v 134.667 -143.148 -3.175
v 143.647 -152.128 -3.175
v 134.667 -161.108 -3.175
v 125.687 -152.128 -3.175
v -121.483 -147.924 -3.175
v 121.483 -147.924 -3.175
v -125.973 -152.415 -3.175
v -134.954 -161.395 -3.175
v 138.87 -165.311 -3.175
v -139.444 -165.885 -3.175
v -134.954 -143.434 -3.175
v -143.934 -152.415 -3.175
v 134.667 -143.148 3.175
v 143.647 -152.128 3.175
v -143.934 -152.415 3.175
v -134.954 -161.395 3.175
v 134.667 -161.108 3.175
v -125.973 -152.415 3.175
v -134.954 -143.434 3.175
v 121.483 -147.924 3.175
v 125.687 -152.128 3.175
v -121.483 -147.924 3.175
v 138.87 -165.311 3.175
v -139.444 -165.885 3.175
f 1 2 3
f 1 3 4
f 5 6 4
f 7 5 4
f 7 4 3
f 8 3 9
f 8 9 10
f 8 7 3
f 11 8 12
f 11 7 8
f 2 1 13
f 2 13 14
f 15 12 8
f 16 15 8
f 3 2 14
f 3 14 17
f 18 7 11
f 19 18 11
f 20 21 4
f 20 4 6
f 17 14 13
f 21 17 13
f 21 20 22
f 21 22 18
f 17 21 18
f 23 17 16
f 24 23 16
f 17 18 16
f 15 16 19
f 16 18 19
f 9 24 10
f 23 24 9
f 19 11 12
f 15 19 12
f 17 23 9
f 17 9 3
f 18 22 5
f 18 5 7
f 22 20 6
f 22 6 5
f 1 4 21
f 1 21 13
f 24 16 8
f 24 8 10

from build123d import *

# Parameters (mm, degrees)
BOSS_EXTRUDE1_DEPTH = 3.175
BOSS_EXTRUDE2_DEPTH = 6.35
BOSS_EXTRUDE4_DEPTH = 6.35


with BuildPart() as part:
    # Sketch1 → Boss-Extrude1 (new, symmetric)
    with BuildSketch(Plane.XY):
        Polygon((-139.443807584, -165.884900532), (138.870288723, -165.311381671), (121.483295342, -147.92438829), (-121.483295342, -147.92438829), align=None)
    extrude(amount=BOSS_EXTRUDE1_DEPTH, both=True)

    # Sketch2 → Boss-Extrude2 (add)
    with BuildSketch(Plane(origin=(0, 0, -3.175), x_dir=(-1, 0, 0), z_dir=(0, 0, -1))):
        Polygon((-125.686663972, -152.12775692), (-134.666920093, -143.147500799), (-143.647176214, -152.12775692), (-134.666920093, -161.108013041), (-138.870288723, -165.311381671), (139.443807584, -165.884900532), (121.483295342, -147.92438829), (-121.483295342, -147.92438829), align=None)
    extrude(amount=-BOSS_EXTRUDE2_DEPTH)

    # Sketch3 → Boss-Extrude4 (add)
    with BuildSketch(Plane(origin=(0, 0, -3.175), x_dir=(-1, 0, 0), z_dir=(0, 0, -1))):
        Polygon((125.973423403, -152.41451635), (134.953679524, -143.434260229), (143.933935645, -152.41451635), (134.953679524, -161.394772471), align=None)
    extrude(amount=-BOSS_EXTRUDE4_DEPTH)


solid = part.part
